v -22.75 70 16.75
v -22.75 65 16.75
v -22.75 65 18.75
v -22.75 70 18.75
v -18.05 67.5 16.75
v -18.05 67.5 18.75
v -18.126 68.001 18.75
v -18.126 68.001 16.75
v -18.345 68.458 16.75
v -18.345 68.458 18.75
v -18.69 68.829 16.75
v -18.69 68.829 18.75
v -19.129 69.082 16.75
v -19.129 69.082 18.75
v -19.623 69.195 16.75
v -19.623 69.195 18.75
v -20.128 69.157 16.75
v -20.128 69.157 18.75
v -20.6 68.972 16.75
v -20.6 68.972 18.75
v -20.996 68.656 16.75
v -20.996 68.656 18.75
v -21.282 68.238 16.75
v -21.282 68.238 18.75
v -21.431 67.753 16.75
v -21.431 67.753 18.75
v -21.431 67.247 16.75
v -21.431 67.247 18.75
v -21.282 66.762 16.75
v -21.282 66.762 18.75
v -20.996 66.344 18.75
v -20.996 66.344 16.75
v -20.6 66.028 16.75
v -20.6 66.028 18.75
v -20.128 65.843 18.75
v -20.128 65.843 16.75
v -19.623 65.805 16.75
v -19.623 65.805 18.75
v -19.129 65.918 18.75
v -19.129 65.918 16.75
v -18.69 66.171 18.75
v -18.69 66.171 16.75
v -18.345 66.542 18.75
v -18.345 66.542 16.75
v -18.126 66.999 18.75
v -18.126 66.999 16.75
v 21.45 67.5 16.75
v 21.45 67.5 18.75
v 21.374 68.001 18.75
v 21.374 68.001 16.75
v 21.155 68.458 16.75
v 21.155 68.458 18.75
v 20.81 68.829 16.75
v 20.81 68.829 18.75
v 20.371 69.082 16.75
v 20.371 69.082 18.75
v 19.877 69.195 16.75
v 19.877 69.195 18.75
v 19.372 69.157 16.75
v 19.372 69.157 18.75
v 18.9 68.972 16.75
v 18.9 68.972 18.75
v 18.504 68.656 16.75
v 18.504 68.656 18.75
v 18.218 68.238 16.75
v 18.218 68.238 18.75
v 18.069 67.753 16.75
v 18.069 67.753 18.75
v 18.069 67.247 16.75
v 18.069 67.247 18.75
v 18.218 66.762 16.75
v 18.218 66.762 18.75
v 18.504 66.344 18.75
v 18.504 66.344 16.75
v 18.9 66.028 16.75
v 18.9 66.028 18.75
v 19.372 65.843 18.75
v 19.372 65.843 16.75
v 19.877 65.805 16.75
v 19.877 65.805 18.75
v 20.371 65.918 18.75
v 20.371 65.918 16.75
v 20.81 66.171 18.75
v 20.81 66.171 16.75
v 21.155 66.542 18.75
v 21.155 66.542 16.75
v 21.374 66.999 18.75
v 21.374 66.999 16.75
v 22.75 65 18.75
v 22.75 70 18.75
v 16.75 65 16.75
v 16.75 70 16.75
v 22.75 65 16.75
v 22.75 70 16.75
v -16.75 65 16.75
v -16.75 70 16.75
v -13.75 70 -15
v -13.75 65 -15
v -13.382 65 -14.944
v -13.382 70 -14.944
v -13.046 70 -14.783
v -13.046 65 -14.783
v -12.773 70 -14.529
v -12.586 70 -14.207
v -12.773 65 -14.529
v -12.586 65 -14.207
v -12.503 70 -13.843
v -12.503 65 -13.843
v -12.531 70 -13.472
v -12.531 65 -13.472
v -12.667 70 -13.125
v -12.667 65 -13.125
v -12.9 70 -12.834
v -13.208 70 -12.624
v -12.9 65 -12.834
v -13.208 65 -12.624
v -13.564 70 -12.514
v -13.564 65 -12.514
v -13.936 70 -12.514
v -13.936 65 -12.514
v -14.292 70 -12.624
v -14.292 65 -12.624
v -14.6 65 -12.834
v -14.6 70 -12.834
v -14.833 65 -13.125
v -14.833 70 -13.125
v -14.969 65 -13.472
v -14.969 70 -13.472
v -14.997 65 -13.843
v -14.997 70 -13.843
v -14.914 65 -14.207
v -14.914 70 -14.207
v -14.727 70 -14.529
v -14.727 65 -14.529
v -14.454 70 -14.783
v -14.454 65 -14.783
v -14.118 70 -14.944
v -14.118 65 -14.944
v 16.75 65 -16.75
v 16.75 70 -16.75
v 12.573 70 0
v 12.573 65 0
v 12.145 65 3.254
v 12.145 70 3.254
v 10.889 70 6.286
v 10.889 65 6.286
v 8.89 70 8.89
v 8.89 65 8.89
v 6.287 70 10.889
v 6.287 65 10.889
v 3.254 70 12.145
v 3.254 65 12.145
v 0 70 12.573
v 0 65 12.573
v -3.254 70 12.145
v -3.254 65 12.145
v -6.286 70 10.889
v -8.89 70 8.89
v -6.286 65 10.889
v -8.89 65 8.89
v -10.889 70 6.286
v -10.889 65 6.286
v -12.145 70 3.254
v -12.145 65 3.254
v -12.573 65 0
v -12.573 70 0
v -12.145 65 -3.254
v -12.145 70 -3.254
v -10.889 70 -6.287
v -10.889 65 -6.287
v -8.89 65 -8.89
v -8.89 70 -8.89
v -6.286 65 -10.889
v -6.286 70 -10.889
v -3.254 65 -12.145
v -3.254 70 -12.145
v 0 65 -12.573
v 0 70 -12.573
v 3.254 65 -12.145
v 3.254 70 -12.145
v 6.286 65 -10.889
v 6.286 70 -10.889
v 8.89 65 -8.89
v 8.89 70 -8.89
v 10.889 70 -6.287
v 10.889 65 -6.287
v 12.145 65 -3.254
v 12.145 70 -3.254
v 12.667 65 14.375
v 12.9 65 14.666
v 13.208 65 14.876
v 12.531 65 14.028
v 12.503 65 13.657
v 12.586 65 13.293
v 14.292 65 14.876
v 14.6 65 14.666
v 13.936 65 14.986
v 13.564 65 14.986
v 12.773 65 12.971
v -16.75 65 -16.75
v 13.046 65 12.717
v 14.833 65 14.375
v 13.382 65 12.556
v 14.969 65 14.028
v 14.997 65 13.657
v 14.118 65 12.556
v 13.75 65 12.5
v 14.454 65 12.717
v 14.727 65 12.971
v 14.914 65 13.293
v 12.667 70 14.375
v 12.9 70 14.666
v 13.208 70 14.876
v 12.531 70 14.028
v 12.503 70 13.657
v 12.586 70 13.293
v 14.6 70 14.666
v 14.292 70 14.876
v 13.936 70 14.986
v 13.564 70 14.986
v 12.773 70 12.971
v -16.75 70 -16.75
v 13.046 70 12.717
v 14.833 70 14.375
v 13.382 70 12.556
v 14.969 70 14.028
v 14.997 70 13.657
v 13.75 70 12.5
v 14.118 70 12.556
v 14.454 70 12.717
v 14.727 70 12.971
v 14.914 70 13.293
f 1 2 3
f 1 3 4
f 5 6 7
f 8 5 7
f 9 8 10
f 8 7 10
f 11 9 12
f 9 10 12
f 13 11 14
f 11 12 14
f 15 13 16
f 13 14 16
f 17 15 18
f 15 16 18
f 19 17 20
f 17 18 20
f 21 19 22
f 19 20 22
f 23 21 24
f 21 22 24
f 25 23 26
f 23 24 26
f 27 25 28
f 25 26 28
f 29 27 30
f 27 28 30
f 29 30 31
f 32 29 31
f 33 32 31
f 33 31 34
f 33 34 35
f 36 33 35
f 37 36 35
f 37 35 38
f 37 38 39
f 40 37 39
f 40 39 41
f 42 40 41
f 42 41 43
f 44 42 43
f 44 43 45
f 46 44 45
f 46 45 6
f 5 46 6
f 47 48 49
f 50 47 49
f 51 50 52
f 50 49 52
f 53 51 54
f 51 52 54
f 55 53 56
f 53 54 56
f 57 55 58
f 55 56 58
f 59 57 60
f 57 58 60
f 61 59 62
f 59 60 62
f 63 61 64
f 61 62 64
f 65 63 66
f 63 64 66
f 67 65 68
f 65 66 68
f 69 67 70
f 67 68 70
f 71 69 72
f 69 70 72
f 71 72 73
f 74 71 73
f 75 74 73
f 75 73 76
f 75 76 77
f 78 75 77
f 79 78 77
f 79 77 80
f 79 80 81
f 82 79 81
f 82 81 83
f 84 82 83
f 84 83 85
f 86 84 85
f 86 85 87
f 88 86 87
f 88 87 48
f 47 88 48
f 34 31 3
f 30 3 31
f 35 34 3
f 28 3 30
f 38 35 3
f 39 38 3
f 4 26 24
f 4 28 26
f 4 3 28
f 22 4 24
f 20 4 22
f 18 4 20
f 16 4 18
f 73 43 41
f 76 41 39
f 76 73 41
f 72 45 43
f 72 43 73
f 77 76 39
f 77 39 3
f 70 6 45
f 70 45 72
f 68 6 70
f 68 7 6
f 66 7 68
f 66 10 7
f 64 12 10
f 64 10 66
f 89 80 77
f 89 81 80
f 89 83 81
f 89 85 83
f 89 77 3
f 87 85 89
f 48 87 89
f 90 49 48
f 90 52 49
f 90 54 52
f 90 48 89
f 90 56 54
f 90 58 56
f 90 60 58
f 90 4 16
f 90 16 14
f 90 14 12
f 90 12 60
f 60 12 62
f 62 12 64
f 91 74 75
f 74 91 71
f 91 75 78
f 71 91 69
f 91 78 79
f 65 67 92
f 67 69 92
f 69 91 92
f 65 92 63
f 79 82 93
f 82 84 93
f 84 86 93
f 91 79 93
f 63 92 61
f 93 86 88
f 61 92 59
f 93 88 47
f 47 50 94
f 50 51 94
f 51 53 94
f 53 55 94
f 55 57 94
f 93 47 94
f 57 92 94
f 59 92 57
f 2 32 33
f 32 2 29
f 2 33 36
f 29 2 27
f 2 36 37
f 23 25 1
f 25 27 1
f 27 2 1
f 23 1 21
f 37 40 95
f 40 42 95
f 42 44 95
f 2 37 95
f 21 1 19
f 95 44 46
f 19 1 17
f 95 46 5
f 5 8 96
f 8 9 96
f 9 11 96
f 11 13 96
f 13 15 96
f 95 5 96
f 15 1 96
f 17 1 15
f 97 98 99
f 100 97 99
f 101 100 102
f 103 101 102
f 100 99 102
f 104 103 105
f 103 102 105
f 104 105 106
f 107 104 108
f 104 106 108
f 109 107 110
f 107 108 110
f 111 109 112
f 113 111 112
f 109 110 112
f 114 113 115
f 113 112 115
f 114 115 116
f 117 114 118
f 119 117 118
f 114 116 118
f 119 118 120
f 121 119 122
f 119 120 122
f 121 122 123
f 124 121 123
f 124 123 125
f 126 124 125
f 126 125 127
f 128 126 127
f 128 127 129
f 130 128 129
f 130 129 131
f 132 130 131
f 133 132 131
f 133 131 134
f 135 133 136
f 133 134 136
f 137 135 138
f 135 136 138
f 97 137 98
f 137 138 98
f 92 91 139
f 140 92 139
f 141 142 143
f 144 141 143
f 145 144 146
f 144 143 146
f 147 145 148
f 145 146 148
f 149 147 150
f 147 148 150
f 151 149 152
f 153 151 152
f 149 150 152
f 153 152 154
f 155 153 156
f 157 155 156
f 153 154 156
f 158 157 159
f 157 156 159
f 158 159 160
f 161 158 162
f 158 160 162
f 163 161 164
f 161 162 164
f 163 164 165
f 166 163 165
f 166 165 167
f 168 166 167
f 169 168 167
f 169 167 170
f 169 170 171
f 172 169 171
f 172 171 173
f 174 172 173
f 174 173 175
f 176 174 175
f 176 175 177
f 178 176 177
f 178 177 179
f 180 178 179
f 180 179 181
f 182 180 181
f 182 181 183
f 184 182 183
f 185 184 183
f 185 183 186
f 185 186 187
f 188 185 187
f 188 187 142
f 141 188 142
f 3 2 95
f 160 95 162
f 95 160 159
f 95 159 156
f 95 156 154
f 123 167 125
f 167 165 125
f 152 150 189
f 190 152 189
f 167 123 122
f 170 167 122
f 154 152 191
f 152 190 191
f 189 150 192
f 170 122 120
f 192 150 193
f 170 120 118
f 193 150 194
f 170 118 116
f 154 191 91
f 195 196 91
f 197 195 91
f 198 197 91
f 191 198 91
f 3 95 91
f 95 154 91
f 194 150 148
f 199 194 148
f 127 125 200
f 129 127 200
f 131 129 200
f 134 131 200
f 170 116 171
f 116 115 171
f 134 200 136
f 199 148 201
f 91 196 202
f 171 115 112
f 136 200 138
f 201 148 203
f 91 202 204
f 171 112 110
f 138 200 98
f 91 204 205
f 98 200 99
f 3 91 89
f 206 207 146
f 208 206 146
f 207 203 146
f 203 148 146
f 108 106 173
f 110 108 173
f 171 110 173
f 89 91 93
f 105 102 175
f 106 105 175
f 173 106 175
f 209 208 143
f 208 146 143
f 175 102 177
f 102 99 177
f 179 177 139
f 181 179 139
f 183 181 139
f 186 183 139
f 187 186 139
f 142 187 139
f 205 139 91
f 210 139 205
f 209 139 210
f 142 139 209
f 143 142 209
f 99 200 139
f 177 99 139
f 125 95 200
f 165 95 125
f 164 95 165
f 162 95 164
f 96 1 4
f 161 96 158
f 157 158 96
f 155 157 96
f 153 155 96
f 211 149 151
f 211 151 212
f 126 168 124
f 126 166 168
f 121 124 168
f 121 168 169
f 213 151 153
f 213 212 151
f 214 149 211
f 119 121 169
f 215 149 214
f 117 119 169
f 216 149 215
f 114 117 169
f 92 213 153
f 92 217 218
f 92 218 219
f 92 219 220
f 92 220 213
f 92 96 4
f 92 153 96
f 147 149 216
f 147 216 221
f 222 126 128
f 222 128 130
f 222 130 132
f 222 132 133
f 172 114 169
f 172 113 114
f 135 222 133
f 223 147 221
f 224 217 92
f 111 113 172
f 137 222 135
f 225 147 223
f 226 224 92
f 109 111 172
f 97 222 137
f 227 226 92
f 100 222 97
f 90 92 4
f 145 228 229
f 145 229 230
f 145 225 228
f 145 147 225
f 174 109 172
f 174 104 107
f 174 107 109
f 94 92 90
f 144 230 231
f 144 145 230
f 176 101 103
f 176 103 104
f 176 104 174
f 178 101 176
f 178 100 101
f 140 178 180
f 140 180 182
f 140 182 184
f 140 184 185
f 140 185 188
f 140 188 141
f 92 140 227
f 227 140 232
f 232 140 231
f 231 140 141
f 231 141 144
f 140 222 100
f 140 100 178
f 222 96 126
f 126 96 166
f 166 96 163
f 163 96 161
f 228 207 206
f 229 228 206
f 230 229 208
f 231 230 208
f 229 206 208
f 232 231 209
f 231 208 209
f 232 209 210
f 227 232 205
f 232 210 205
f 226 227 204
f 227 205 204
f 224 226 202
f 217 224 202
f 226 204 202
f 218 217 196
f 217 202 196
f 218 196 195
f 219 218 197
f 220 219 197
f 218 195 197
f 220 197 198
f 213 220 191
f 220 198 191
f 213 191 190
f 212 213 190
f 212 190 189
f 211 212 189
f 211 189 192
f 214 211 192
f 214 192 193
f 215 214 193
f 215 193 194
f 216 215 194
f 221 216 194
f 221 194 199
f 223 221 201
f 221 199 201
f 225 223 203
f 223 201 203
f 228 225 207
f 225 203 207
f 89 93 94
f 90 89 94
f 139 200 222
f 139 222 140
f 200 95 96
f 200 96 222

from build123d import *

# Parameters (mm, degrees)
SKETCH1_W                     = 33.5
SKETCH1_H                     = 33.5
BOSS_EXTRUDE1_DEPTH           = 70
M3X0_5_TAPPED_HOLE1_D         = 2.5
M3X0_5_TAPPED_HOLE1_DEPTH     = 7.62
M3X0_5_TAPPED_HOLE1_TIP       = 0.751075774
M3X0_5_TAPPED_HOLE2_D         = 2.5
M3X0_5_TAPPED_HOLE2_DEPTH     = 7.62
M3X0_5_TAPPED_HOLE2_TIP       = 0.751075774
SKETCH7_W                     = 6
SKETCH7_H                     = 50
BOSS_EXTRUDE2_DEPTH           = 3
SKETCH8_W                     = 6
SKETCH8_H                     = 50
BOSS_EXTRUDE3_DEPTH           = 3
SKETCH10_W                    = 1.7
SKETCH10_H                    = 33.5
M3_CLEARANCE_HOLE1_AT_2_COUNT = 2
M3_CLEARANCE_HOLE1_AT_2_PITCH = 25
M3_CLEARANCE_HOLE1_AT_3_COUNT = 2
M3_CLEARANCE_HOLE1_AT_3_PITCH = 39.5
M3_CLEARANCE_HOLE1_AT_4_COUNT = 2
M3_CLEARANCE_HOLE1_AT_4_PITCH = 46.746657635
SKETCH11_R                    = 12.573
CUT_EXTRUDE1_DEPTH            = 71
SKETCH12_W                    = 33.5
SKETCH12_H                    = 45
CUT_EXTRUDE2_DEPTH            = 32.5
SKETCH13_W                    = 45.5
SKETCH13_H                    = 70.777616709
CUT_EXTRUDE3_DEPTH            = 34.5
SKETCH14_W                    = 45.5
SKETCH14_H                    = 5
BOSS_EXTRUDE4_DEPTH           = 2
M3_CLEARANCE_HOLE2_D          = 3.4


with BuildPart() as part:
    # Sketch1 → Boss-Extrude1 (new body)
    with BuildSketch(Plane(origin=(0, 0, 0), x_dir=(1, 0, 0), z_dir=(0, 1, 0))):
        Rectangle(SKETCH1_W, SKETCH1_H)
    extrude(amount=BOSS_EXTRUDE1_DEPTH)

    # M3x0.5 Tapped Hole1
    with Locations(Plane(origin=(13.75, 70, 13.75), x_dir=(0, 0, 1), z_dir=(0, 1, 0))):
        with Locations((0, 0), (-27.5, -27.5)):
            Hole(M3X0_5_TAPPED_HOLE1_D / 2, depth=M3X0_5_TAPPED_HOLE1_DEPTH)
            with Locations((0, 0, -(M3X0_5_TAPPED_HOLE1_DEPTH + M3X0_5_TAPPED_HOLE1_TIP / 2))):  # 118° drill point
                Cone(0, M3X0_5_TAPPED_HOLE1_D / 2, M3X0_5_TAPPED_HOLE1_TIP, mode=Mode.SUBTRACT)

    # M3x0.5 Tapped Hole2
    with Locations(Plane(origin=(16.75, 6, 13.75), x_dir=(0, 0, 1), z_dir=(1, 0, 0))):
        with Locations((0, 0), (-27.5, 0)):
            Hole(M3X0_5_TAPPED_HOLE2_D / 2, depth=M3X0_5_TAPPED_HOLE2_DEPTH)
            with Locations((0, 0, -(M3X0_5_TAPPED_HOLE2_DEPTH + M3X0_5_TAPPED_HOLE2_TIP / 2))):  # 118° drill point
                Cone(0, M3X0_5_TAPPED_HOLE2_D / 2, M3X0_5_TAPPED_HOLE2_TIP, mode=Mode.SUBTRACT)

    # Sketch11 → Cut-Extrude1 (cut, through all)
    with BuildSketch(Plane.XZ):
        Circle(SKETCH11_R)
    extrude(amount=-CUT_EXTRUDE1_DEPTH, mode=Mode.SUBTRACT)

    # Sketch12 → Cut-Extrude2 (cut)
    with BuildSketch(Plane.XY.offset(16.75)):
        with Locations((0, 35.5)):
            Rectangle(SKETCH12_W, SKETCH12_H)
    extrude(amount=-CUT_EXTRUDE2_DEPTH, mode=Mode.SUBTRACT)


with BuildPart() as body_2:
    # Sketch7 → Boss-Extrude2 (new body)
    with BuildSketch(Plane(origin=(0, 0, -16.75), x_dir=(-1, 0, 0), z_dir=(0, 0, -1))):
        with Locations((-19.75, 36)):
            Rectangle(SKETCH7_W, SKETCH7_H)
    extrude(amount=-BOSS_EXTRUDE2_DEPTH)

    # Sketch10 → M3 Clearance Hole1 (revolve, cut)
    with BuildSketch(Plane(origin=(19.75, 51, -16.75), x_dir=(0, 1, 0), z_dir=(1, 0, 0))):
        with Locations((0.85, 16.75)):
            Rectangle(SKETCH10_W, SKETCH10_H)
    m3_clearance_hole1 = revolve(axis=Axis((19.75, 51, -23.1), (0, 0, 1)), mode=Mode.SUBTRACT)

    # M3 Clearance Hole1 at 2: M3 Clearance Hole1 ×2
    with Locations(*[(0, -i * M3_CLEARANCE_HOLE1_AT_2_PITCH, 0) for i in range(1, M3_CLEARANCE_HOLE1_AT_2_COUNT)]):
        add(m3_clearance_hole1, mode=Mode.SUBTRACT)


with BuildPart() as body_3:
    # Sketch8 → Boss-Extrude3 (new body)
    with BuildSketch(Plane(origin=(0, 0, -16.75), x_dir=(-1, 0, 0), z_dir=(0, 0, -1))):
        with Locations((19.75, 36)):
            Rectangle(SKETCH8_W, SKETCH8_H)
    extrude(amount=-BOSS_EXTRUDE3_DEPTH)

    # M3 Clearance Hole1 at 3: M3 Clearance Hole1 ×2
    with Locations(*[(-i * M3_CLEARANCE_HOLE1_AT_3_PITCH, 0, 0) for i in range(1, M3_CLEARANCE_HOLE1_AT_3_COUNT)]):
        add(m3_clearance_hole1, mode=Mode.SUBTRACT)

    # M3 Clearance Hole1 at 4: M3 Clearance Hole1 ×2
    with Locations(*[Vector(-0.844980197, -0.534797593, 0) * (i * M3_CLEARANCE_HOLE1_AT_4_PITCH) for i in range(1, M3_CLEARANCE_HOLE1_AT_4_COUNT)]):
        add(m3_clearance_hole1, mode=Mode.SUBTRACT)


with BuildPart() as cut_extrude3_tool:
    # Sketch13 → Cut-Extrude3 (new body, through all)
    with BuildSketch(Plane.XY.offset(16.75)):
        with Locations((0, 29.611191645)):
            Rectangle(SKETCH13_W, SKETCH13_H)
    extrude(amount=-CUT_EXTRUDE3_DEPTH)


with BuildPart() as part_1:
    add(part.part)

    # Cut-Extrude3: cut by cut_extrude3_tool
    add(cut_extrude3_tool.part, mode=Mode.SUBTRACT)

    # Sketch14 → Boss-Extrude4 (add)
    with BuildSketch(Plane.XY.offset(16.75)):
        with Locations((0, 67.5)):
            Rectangle(SKETCH14_W, SKETCH14_H)
    extrude(amount=BOSS_EXTRUDE4_DEPTH)

    # M3 Clearance Hole2 (through all)
    with Locations(Plane(origin=(-19.75, 67.5, 16.75), x_dir=(-1, 0, 0), z_dir=(0, 0, -1))):
        with Locations((0, 0), (-39.5, 0)):
            Hole(M3_CLEARANCE_HOLE2_D / 2)


with BuildPart() as body_2_1:
    add(body_2.part)

    # Cut-Extrude3: cut by cut_extrude3_tool
    add(cut_extrude3_tool.part, mode=Mode.SUBTRACT)


with BuildPart() as body_3_1:
    add(body_3.part)

    # Cut-Extrude3: cut by cut_extrude3_tool
    add(cut_extrude3_tool.part, mode=Mode.SUBTRACT)


solid = part_1.part
